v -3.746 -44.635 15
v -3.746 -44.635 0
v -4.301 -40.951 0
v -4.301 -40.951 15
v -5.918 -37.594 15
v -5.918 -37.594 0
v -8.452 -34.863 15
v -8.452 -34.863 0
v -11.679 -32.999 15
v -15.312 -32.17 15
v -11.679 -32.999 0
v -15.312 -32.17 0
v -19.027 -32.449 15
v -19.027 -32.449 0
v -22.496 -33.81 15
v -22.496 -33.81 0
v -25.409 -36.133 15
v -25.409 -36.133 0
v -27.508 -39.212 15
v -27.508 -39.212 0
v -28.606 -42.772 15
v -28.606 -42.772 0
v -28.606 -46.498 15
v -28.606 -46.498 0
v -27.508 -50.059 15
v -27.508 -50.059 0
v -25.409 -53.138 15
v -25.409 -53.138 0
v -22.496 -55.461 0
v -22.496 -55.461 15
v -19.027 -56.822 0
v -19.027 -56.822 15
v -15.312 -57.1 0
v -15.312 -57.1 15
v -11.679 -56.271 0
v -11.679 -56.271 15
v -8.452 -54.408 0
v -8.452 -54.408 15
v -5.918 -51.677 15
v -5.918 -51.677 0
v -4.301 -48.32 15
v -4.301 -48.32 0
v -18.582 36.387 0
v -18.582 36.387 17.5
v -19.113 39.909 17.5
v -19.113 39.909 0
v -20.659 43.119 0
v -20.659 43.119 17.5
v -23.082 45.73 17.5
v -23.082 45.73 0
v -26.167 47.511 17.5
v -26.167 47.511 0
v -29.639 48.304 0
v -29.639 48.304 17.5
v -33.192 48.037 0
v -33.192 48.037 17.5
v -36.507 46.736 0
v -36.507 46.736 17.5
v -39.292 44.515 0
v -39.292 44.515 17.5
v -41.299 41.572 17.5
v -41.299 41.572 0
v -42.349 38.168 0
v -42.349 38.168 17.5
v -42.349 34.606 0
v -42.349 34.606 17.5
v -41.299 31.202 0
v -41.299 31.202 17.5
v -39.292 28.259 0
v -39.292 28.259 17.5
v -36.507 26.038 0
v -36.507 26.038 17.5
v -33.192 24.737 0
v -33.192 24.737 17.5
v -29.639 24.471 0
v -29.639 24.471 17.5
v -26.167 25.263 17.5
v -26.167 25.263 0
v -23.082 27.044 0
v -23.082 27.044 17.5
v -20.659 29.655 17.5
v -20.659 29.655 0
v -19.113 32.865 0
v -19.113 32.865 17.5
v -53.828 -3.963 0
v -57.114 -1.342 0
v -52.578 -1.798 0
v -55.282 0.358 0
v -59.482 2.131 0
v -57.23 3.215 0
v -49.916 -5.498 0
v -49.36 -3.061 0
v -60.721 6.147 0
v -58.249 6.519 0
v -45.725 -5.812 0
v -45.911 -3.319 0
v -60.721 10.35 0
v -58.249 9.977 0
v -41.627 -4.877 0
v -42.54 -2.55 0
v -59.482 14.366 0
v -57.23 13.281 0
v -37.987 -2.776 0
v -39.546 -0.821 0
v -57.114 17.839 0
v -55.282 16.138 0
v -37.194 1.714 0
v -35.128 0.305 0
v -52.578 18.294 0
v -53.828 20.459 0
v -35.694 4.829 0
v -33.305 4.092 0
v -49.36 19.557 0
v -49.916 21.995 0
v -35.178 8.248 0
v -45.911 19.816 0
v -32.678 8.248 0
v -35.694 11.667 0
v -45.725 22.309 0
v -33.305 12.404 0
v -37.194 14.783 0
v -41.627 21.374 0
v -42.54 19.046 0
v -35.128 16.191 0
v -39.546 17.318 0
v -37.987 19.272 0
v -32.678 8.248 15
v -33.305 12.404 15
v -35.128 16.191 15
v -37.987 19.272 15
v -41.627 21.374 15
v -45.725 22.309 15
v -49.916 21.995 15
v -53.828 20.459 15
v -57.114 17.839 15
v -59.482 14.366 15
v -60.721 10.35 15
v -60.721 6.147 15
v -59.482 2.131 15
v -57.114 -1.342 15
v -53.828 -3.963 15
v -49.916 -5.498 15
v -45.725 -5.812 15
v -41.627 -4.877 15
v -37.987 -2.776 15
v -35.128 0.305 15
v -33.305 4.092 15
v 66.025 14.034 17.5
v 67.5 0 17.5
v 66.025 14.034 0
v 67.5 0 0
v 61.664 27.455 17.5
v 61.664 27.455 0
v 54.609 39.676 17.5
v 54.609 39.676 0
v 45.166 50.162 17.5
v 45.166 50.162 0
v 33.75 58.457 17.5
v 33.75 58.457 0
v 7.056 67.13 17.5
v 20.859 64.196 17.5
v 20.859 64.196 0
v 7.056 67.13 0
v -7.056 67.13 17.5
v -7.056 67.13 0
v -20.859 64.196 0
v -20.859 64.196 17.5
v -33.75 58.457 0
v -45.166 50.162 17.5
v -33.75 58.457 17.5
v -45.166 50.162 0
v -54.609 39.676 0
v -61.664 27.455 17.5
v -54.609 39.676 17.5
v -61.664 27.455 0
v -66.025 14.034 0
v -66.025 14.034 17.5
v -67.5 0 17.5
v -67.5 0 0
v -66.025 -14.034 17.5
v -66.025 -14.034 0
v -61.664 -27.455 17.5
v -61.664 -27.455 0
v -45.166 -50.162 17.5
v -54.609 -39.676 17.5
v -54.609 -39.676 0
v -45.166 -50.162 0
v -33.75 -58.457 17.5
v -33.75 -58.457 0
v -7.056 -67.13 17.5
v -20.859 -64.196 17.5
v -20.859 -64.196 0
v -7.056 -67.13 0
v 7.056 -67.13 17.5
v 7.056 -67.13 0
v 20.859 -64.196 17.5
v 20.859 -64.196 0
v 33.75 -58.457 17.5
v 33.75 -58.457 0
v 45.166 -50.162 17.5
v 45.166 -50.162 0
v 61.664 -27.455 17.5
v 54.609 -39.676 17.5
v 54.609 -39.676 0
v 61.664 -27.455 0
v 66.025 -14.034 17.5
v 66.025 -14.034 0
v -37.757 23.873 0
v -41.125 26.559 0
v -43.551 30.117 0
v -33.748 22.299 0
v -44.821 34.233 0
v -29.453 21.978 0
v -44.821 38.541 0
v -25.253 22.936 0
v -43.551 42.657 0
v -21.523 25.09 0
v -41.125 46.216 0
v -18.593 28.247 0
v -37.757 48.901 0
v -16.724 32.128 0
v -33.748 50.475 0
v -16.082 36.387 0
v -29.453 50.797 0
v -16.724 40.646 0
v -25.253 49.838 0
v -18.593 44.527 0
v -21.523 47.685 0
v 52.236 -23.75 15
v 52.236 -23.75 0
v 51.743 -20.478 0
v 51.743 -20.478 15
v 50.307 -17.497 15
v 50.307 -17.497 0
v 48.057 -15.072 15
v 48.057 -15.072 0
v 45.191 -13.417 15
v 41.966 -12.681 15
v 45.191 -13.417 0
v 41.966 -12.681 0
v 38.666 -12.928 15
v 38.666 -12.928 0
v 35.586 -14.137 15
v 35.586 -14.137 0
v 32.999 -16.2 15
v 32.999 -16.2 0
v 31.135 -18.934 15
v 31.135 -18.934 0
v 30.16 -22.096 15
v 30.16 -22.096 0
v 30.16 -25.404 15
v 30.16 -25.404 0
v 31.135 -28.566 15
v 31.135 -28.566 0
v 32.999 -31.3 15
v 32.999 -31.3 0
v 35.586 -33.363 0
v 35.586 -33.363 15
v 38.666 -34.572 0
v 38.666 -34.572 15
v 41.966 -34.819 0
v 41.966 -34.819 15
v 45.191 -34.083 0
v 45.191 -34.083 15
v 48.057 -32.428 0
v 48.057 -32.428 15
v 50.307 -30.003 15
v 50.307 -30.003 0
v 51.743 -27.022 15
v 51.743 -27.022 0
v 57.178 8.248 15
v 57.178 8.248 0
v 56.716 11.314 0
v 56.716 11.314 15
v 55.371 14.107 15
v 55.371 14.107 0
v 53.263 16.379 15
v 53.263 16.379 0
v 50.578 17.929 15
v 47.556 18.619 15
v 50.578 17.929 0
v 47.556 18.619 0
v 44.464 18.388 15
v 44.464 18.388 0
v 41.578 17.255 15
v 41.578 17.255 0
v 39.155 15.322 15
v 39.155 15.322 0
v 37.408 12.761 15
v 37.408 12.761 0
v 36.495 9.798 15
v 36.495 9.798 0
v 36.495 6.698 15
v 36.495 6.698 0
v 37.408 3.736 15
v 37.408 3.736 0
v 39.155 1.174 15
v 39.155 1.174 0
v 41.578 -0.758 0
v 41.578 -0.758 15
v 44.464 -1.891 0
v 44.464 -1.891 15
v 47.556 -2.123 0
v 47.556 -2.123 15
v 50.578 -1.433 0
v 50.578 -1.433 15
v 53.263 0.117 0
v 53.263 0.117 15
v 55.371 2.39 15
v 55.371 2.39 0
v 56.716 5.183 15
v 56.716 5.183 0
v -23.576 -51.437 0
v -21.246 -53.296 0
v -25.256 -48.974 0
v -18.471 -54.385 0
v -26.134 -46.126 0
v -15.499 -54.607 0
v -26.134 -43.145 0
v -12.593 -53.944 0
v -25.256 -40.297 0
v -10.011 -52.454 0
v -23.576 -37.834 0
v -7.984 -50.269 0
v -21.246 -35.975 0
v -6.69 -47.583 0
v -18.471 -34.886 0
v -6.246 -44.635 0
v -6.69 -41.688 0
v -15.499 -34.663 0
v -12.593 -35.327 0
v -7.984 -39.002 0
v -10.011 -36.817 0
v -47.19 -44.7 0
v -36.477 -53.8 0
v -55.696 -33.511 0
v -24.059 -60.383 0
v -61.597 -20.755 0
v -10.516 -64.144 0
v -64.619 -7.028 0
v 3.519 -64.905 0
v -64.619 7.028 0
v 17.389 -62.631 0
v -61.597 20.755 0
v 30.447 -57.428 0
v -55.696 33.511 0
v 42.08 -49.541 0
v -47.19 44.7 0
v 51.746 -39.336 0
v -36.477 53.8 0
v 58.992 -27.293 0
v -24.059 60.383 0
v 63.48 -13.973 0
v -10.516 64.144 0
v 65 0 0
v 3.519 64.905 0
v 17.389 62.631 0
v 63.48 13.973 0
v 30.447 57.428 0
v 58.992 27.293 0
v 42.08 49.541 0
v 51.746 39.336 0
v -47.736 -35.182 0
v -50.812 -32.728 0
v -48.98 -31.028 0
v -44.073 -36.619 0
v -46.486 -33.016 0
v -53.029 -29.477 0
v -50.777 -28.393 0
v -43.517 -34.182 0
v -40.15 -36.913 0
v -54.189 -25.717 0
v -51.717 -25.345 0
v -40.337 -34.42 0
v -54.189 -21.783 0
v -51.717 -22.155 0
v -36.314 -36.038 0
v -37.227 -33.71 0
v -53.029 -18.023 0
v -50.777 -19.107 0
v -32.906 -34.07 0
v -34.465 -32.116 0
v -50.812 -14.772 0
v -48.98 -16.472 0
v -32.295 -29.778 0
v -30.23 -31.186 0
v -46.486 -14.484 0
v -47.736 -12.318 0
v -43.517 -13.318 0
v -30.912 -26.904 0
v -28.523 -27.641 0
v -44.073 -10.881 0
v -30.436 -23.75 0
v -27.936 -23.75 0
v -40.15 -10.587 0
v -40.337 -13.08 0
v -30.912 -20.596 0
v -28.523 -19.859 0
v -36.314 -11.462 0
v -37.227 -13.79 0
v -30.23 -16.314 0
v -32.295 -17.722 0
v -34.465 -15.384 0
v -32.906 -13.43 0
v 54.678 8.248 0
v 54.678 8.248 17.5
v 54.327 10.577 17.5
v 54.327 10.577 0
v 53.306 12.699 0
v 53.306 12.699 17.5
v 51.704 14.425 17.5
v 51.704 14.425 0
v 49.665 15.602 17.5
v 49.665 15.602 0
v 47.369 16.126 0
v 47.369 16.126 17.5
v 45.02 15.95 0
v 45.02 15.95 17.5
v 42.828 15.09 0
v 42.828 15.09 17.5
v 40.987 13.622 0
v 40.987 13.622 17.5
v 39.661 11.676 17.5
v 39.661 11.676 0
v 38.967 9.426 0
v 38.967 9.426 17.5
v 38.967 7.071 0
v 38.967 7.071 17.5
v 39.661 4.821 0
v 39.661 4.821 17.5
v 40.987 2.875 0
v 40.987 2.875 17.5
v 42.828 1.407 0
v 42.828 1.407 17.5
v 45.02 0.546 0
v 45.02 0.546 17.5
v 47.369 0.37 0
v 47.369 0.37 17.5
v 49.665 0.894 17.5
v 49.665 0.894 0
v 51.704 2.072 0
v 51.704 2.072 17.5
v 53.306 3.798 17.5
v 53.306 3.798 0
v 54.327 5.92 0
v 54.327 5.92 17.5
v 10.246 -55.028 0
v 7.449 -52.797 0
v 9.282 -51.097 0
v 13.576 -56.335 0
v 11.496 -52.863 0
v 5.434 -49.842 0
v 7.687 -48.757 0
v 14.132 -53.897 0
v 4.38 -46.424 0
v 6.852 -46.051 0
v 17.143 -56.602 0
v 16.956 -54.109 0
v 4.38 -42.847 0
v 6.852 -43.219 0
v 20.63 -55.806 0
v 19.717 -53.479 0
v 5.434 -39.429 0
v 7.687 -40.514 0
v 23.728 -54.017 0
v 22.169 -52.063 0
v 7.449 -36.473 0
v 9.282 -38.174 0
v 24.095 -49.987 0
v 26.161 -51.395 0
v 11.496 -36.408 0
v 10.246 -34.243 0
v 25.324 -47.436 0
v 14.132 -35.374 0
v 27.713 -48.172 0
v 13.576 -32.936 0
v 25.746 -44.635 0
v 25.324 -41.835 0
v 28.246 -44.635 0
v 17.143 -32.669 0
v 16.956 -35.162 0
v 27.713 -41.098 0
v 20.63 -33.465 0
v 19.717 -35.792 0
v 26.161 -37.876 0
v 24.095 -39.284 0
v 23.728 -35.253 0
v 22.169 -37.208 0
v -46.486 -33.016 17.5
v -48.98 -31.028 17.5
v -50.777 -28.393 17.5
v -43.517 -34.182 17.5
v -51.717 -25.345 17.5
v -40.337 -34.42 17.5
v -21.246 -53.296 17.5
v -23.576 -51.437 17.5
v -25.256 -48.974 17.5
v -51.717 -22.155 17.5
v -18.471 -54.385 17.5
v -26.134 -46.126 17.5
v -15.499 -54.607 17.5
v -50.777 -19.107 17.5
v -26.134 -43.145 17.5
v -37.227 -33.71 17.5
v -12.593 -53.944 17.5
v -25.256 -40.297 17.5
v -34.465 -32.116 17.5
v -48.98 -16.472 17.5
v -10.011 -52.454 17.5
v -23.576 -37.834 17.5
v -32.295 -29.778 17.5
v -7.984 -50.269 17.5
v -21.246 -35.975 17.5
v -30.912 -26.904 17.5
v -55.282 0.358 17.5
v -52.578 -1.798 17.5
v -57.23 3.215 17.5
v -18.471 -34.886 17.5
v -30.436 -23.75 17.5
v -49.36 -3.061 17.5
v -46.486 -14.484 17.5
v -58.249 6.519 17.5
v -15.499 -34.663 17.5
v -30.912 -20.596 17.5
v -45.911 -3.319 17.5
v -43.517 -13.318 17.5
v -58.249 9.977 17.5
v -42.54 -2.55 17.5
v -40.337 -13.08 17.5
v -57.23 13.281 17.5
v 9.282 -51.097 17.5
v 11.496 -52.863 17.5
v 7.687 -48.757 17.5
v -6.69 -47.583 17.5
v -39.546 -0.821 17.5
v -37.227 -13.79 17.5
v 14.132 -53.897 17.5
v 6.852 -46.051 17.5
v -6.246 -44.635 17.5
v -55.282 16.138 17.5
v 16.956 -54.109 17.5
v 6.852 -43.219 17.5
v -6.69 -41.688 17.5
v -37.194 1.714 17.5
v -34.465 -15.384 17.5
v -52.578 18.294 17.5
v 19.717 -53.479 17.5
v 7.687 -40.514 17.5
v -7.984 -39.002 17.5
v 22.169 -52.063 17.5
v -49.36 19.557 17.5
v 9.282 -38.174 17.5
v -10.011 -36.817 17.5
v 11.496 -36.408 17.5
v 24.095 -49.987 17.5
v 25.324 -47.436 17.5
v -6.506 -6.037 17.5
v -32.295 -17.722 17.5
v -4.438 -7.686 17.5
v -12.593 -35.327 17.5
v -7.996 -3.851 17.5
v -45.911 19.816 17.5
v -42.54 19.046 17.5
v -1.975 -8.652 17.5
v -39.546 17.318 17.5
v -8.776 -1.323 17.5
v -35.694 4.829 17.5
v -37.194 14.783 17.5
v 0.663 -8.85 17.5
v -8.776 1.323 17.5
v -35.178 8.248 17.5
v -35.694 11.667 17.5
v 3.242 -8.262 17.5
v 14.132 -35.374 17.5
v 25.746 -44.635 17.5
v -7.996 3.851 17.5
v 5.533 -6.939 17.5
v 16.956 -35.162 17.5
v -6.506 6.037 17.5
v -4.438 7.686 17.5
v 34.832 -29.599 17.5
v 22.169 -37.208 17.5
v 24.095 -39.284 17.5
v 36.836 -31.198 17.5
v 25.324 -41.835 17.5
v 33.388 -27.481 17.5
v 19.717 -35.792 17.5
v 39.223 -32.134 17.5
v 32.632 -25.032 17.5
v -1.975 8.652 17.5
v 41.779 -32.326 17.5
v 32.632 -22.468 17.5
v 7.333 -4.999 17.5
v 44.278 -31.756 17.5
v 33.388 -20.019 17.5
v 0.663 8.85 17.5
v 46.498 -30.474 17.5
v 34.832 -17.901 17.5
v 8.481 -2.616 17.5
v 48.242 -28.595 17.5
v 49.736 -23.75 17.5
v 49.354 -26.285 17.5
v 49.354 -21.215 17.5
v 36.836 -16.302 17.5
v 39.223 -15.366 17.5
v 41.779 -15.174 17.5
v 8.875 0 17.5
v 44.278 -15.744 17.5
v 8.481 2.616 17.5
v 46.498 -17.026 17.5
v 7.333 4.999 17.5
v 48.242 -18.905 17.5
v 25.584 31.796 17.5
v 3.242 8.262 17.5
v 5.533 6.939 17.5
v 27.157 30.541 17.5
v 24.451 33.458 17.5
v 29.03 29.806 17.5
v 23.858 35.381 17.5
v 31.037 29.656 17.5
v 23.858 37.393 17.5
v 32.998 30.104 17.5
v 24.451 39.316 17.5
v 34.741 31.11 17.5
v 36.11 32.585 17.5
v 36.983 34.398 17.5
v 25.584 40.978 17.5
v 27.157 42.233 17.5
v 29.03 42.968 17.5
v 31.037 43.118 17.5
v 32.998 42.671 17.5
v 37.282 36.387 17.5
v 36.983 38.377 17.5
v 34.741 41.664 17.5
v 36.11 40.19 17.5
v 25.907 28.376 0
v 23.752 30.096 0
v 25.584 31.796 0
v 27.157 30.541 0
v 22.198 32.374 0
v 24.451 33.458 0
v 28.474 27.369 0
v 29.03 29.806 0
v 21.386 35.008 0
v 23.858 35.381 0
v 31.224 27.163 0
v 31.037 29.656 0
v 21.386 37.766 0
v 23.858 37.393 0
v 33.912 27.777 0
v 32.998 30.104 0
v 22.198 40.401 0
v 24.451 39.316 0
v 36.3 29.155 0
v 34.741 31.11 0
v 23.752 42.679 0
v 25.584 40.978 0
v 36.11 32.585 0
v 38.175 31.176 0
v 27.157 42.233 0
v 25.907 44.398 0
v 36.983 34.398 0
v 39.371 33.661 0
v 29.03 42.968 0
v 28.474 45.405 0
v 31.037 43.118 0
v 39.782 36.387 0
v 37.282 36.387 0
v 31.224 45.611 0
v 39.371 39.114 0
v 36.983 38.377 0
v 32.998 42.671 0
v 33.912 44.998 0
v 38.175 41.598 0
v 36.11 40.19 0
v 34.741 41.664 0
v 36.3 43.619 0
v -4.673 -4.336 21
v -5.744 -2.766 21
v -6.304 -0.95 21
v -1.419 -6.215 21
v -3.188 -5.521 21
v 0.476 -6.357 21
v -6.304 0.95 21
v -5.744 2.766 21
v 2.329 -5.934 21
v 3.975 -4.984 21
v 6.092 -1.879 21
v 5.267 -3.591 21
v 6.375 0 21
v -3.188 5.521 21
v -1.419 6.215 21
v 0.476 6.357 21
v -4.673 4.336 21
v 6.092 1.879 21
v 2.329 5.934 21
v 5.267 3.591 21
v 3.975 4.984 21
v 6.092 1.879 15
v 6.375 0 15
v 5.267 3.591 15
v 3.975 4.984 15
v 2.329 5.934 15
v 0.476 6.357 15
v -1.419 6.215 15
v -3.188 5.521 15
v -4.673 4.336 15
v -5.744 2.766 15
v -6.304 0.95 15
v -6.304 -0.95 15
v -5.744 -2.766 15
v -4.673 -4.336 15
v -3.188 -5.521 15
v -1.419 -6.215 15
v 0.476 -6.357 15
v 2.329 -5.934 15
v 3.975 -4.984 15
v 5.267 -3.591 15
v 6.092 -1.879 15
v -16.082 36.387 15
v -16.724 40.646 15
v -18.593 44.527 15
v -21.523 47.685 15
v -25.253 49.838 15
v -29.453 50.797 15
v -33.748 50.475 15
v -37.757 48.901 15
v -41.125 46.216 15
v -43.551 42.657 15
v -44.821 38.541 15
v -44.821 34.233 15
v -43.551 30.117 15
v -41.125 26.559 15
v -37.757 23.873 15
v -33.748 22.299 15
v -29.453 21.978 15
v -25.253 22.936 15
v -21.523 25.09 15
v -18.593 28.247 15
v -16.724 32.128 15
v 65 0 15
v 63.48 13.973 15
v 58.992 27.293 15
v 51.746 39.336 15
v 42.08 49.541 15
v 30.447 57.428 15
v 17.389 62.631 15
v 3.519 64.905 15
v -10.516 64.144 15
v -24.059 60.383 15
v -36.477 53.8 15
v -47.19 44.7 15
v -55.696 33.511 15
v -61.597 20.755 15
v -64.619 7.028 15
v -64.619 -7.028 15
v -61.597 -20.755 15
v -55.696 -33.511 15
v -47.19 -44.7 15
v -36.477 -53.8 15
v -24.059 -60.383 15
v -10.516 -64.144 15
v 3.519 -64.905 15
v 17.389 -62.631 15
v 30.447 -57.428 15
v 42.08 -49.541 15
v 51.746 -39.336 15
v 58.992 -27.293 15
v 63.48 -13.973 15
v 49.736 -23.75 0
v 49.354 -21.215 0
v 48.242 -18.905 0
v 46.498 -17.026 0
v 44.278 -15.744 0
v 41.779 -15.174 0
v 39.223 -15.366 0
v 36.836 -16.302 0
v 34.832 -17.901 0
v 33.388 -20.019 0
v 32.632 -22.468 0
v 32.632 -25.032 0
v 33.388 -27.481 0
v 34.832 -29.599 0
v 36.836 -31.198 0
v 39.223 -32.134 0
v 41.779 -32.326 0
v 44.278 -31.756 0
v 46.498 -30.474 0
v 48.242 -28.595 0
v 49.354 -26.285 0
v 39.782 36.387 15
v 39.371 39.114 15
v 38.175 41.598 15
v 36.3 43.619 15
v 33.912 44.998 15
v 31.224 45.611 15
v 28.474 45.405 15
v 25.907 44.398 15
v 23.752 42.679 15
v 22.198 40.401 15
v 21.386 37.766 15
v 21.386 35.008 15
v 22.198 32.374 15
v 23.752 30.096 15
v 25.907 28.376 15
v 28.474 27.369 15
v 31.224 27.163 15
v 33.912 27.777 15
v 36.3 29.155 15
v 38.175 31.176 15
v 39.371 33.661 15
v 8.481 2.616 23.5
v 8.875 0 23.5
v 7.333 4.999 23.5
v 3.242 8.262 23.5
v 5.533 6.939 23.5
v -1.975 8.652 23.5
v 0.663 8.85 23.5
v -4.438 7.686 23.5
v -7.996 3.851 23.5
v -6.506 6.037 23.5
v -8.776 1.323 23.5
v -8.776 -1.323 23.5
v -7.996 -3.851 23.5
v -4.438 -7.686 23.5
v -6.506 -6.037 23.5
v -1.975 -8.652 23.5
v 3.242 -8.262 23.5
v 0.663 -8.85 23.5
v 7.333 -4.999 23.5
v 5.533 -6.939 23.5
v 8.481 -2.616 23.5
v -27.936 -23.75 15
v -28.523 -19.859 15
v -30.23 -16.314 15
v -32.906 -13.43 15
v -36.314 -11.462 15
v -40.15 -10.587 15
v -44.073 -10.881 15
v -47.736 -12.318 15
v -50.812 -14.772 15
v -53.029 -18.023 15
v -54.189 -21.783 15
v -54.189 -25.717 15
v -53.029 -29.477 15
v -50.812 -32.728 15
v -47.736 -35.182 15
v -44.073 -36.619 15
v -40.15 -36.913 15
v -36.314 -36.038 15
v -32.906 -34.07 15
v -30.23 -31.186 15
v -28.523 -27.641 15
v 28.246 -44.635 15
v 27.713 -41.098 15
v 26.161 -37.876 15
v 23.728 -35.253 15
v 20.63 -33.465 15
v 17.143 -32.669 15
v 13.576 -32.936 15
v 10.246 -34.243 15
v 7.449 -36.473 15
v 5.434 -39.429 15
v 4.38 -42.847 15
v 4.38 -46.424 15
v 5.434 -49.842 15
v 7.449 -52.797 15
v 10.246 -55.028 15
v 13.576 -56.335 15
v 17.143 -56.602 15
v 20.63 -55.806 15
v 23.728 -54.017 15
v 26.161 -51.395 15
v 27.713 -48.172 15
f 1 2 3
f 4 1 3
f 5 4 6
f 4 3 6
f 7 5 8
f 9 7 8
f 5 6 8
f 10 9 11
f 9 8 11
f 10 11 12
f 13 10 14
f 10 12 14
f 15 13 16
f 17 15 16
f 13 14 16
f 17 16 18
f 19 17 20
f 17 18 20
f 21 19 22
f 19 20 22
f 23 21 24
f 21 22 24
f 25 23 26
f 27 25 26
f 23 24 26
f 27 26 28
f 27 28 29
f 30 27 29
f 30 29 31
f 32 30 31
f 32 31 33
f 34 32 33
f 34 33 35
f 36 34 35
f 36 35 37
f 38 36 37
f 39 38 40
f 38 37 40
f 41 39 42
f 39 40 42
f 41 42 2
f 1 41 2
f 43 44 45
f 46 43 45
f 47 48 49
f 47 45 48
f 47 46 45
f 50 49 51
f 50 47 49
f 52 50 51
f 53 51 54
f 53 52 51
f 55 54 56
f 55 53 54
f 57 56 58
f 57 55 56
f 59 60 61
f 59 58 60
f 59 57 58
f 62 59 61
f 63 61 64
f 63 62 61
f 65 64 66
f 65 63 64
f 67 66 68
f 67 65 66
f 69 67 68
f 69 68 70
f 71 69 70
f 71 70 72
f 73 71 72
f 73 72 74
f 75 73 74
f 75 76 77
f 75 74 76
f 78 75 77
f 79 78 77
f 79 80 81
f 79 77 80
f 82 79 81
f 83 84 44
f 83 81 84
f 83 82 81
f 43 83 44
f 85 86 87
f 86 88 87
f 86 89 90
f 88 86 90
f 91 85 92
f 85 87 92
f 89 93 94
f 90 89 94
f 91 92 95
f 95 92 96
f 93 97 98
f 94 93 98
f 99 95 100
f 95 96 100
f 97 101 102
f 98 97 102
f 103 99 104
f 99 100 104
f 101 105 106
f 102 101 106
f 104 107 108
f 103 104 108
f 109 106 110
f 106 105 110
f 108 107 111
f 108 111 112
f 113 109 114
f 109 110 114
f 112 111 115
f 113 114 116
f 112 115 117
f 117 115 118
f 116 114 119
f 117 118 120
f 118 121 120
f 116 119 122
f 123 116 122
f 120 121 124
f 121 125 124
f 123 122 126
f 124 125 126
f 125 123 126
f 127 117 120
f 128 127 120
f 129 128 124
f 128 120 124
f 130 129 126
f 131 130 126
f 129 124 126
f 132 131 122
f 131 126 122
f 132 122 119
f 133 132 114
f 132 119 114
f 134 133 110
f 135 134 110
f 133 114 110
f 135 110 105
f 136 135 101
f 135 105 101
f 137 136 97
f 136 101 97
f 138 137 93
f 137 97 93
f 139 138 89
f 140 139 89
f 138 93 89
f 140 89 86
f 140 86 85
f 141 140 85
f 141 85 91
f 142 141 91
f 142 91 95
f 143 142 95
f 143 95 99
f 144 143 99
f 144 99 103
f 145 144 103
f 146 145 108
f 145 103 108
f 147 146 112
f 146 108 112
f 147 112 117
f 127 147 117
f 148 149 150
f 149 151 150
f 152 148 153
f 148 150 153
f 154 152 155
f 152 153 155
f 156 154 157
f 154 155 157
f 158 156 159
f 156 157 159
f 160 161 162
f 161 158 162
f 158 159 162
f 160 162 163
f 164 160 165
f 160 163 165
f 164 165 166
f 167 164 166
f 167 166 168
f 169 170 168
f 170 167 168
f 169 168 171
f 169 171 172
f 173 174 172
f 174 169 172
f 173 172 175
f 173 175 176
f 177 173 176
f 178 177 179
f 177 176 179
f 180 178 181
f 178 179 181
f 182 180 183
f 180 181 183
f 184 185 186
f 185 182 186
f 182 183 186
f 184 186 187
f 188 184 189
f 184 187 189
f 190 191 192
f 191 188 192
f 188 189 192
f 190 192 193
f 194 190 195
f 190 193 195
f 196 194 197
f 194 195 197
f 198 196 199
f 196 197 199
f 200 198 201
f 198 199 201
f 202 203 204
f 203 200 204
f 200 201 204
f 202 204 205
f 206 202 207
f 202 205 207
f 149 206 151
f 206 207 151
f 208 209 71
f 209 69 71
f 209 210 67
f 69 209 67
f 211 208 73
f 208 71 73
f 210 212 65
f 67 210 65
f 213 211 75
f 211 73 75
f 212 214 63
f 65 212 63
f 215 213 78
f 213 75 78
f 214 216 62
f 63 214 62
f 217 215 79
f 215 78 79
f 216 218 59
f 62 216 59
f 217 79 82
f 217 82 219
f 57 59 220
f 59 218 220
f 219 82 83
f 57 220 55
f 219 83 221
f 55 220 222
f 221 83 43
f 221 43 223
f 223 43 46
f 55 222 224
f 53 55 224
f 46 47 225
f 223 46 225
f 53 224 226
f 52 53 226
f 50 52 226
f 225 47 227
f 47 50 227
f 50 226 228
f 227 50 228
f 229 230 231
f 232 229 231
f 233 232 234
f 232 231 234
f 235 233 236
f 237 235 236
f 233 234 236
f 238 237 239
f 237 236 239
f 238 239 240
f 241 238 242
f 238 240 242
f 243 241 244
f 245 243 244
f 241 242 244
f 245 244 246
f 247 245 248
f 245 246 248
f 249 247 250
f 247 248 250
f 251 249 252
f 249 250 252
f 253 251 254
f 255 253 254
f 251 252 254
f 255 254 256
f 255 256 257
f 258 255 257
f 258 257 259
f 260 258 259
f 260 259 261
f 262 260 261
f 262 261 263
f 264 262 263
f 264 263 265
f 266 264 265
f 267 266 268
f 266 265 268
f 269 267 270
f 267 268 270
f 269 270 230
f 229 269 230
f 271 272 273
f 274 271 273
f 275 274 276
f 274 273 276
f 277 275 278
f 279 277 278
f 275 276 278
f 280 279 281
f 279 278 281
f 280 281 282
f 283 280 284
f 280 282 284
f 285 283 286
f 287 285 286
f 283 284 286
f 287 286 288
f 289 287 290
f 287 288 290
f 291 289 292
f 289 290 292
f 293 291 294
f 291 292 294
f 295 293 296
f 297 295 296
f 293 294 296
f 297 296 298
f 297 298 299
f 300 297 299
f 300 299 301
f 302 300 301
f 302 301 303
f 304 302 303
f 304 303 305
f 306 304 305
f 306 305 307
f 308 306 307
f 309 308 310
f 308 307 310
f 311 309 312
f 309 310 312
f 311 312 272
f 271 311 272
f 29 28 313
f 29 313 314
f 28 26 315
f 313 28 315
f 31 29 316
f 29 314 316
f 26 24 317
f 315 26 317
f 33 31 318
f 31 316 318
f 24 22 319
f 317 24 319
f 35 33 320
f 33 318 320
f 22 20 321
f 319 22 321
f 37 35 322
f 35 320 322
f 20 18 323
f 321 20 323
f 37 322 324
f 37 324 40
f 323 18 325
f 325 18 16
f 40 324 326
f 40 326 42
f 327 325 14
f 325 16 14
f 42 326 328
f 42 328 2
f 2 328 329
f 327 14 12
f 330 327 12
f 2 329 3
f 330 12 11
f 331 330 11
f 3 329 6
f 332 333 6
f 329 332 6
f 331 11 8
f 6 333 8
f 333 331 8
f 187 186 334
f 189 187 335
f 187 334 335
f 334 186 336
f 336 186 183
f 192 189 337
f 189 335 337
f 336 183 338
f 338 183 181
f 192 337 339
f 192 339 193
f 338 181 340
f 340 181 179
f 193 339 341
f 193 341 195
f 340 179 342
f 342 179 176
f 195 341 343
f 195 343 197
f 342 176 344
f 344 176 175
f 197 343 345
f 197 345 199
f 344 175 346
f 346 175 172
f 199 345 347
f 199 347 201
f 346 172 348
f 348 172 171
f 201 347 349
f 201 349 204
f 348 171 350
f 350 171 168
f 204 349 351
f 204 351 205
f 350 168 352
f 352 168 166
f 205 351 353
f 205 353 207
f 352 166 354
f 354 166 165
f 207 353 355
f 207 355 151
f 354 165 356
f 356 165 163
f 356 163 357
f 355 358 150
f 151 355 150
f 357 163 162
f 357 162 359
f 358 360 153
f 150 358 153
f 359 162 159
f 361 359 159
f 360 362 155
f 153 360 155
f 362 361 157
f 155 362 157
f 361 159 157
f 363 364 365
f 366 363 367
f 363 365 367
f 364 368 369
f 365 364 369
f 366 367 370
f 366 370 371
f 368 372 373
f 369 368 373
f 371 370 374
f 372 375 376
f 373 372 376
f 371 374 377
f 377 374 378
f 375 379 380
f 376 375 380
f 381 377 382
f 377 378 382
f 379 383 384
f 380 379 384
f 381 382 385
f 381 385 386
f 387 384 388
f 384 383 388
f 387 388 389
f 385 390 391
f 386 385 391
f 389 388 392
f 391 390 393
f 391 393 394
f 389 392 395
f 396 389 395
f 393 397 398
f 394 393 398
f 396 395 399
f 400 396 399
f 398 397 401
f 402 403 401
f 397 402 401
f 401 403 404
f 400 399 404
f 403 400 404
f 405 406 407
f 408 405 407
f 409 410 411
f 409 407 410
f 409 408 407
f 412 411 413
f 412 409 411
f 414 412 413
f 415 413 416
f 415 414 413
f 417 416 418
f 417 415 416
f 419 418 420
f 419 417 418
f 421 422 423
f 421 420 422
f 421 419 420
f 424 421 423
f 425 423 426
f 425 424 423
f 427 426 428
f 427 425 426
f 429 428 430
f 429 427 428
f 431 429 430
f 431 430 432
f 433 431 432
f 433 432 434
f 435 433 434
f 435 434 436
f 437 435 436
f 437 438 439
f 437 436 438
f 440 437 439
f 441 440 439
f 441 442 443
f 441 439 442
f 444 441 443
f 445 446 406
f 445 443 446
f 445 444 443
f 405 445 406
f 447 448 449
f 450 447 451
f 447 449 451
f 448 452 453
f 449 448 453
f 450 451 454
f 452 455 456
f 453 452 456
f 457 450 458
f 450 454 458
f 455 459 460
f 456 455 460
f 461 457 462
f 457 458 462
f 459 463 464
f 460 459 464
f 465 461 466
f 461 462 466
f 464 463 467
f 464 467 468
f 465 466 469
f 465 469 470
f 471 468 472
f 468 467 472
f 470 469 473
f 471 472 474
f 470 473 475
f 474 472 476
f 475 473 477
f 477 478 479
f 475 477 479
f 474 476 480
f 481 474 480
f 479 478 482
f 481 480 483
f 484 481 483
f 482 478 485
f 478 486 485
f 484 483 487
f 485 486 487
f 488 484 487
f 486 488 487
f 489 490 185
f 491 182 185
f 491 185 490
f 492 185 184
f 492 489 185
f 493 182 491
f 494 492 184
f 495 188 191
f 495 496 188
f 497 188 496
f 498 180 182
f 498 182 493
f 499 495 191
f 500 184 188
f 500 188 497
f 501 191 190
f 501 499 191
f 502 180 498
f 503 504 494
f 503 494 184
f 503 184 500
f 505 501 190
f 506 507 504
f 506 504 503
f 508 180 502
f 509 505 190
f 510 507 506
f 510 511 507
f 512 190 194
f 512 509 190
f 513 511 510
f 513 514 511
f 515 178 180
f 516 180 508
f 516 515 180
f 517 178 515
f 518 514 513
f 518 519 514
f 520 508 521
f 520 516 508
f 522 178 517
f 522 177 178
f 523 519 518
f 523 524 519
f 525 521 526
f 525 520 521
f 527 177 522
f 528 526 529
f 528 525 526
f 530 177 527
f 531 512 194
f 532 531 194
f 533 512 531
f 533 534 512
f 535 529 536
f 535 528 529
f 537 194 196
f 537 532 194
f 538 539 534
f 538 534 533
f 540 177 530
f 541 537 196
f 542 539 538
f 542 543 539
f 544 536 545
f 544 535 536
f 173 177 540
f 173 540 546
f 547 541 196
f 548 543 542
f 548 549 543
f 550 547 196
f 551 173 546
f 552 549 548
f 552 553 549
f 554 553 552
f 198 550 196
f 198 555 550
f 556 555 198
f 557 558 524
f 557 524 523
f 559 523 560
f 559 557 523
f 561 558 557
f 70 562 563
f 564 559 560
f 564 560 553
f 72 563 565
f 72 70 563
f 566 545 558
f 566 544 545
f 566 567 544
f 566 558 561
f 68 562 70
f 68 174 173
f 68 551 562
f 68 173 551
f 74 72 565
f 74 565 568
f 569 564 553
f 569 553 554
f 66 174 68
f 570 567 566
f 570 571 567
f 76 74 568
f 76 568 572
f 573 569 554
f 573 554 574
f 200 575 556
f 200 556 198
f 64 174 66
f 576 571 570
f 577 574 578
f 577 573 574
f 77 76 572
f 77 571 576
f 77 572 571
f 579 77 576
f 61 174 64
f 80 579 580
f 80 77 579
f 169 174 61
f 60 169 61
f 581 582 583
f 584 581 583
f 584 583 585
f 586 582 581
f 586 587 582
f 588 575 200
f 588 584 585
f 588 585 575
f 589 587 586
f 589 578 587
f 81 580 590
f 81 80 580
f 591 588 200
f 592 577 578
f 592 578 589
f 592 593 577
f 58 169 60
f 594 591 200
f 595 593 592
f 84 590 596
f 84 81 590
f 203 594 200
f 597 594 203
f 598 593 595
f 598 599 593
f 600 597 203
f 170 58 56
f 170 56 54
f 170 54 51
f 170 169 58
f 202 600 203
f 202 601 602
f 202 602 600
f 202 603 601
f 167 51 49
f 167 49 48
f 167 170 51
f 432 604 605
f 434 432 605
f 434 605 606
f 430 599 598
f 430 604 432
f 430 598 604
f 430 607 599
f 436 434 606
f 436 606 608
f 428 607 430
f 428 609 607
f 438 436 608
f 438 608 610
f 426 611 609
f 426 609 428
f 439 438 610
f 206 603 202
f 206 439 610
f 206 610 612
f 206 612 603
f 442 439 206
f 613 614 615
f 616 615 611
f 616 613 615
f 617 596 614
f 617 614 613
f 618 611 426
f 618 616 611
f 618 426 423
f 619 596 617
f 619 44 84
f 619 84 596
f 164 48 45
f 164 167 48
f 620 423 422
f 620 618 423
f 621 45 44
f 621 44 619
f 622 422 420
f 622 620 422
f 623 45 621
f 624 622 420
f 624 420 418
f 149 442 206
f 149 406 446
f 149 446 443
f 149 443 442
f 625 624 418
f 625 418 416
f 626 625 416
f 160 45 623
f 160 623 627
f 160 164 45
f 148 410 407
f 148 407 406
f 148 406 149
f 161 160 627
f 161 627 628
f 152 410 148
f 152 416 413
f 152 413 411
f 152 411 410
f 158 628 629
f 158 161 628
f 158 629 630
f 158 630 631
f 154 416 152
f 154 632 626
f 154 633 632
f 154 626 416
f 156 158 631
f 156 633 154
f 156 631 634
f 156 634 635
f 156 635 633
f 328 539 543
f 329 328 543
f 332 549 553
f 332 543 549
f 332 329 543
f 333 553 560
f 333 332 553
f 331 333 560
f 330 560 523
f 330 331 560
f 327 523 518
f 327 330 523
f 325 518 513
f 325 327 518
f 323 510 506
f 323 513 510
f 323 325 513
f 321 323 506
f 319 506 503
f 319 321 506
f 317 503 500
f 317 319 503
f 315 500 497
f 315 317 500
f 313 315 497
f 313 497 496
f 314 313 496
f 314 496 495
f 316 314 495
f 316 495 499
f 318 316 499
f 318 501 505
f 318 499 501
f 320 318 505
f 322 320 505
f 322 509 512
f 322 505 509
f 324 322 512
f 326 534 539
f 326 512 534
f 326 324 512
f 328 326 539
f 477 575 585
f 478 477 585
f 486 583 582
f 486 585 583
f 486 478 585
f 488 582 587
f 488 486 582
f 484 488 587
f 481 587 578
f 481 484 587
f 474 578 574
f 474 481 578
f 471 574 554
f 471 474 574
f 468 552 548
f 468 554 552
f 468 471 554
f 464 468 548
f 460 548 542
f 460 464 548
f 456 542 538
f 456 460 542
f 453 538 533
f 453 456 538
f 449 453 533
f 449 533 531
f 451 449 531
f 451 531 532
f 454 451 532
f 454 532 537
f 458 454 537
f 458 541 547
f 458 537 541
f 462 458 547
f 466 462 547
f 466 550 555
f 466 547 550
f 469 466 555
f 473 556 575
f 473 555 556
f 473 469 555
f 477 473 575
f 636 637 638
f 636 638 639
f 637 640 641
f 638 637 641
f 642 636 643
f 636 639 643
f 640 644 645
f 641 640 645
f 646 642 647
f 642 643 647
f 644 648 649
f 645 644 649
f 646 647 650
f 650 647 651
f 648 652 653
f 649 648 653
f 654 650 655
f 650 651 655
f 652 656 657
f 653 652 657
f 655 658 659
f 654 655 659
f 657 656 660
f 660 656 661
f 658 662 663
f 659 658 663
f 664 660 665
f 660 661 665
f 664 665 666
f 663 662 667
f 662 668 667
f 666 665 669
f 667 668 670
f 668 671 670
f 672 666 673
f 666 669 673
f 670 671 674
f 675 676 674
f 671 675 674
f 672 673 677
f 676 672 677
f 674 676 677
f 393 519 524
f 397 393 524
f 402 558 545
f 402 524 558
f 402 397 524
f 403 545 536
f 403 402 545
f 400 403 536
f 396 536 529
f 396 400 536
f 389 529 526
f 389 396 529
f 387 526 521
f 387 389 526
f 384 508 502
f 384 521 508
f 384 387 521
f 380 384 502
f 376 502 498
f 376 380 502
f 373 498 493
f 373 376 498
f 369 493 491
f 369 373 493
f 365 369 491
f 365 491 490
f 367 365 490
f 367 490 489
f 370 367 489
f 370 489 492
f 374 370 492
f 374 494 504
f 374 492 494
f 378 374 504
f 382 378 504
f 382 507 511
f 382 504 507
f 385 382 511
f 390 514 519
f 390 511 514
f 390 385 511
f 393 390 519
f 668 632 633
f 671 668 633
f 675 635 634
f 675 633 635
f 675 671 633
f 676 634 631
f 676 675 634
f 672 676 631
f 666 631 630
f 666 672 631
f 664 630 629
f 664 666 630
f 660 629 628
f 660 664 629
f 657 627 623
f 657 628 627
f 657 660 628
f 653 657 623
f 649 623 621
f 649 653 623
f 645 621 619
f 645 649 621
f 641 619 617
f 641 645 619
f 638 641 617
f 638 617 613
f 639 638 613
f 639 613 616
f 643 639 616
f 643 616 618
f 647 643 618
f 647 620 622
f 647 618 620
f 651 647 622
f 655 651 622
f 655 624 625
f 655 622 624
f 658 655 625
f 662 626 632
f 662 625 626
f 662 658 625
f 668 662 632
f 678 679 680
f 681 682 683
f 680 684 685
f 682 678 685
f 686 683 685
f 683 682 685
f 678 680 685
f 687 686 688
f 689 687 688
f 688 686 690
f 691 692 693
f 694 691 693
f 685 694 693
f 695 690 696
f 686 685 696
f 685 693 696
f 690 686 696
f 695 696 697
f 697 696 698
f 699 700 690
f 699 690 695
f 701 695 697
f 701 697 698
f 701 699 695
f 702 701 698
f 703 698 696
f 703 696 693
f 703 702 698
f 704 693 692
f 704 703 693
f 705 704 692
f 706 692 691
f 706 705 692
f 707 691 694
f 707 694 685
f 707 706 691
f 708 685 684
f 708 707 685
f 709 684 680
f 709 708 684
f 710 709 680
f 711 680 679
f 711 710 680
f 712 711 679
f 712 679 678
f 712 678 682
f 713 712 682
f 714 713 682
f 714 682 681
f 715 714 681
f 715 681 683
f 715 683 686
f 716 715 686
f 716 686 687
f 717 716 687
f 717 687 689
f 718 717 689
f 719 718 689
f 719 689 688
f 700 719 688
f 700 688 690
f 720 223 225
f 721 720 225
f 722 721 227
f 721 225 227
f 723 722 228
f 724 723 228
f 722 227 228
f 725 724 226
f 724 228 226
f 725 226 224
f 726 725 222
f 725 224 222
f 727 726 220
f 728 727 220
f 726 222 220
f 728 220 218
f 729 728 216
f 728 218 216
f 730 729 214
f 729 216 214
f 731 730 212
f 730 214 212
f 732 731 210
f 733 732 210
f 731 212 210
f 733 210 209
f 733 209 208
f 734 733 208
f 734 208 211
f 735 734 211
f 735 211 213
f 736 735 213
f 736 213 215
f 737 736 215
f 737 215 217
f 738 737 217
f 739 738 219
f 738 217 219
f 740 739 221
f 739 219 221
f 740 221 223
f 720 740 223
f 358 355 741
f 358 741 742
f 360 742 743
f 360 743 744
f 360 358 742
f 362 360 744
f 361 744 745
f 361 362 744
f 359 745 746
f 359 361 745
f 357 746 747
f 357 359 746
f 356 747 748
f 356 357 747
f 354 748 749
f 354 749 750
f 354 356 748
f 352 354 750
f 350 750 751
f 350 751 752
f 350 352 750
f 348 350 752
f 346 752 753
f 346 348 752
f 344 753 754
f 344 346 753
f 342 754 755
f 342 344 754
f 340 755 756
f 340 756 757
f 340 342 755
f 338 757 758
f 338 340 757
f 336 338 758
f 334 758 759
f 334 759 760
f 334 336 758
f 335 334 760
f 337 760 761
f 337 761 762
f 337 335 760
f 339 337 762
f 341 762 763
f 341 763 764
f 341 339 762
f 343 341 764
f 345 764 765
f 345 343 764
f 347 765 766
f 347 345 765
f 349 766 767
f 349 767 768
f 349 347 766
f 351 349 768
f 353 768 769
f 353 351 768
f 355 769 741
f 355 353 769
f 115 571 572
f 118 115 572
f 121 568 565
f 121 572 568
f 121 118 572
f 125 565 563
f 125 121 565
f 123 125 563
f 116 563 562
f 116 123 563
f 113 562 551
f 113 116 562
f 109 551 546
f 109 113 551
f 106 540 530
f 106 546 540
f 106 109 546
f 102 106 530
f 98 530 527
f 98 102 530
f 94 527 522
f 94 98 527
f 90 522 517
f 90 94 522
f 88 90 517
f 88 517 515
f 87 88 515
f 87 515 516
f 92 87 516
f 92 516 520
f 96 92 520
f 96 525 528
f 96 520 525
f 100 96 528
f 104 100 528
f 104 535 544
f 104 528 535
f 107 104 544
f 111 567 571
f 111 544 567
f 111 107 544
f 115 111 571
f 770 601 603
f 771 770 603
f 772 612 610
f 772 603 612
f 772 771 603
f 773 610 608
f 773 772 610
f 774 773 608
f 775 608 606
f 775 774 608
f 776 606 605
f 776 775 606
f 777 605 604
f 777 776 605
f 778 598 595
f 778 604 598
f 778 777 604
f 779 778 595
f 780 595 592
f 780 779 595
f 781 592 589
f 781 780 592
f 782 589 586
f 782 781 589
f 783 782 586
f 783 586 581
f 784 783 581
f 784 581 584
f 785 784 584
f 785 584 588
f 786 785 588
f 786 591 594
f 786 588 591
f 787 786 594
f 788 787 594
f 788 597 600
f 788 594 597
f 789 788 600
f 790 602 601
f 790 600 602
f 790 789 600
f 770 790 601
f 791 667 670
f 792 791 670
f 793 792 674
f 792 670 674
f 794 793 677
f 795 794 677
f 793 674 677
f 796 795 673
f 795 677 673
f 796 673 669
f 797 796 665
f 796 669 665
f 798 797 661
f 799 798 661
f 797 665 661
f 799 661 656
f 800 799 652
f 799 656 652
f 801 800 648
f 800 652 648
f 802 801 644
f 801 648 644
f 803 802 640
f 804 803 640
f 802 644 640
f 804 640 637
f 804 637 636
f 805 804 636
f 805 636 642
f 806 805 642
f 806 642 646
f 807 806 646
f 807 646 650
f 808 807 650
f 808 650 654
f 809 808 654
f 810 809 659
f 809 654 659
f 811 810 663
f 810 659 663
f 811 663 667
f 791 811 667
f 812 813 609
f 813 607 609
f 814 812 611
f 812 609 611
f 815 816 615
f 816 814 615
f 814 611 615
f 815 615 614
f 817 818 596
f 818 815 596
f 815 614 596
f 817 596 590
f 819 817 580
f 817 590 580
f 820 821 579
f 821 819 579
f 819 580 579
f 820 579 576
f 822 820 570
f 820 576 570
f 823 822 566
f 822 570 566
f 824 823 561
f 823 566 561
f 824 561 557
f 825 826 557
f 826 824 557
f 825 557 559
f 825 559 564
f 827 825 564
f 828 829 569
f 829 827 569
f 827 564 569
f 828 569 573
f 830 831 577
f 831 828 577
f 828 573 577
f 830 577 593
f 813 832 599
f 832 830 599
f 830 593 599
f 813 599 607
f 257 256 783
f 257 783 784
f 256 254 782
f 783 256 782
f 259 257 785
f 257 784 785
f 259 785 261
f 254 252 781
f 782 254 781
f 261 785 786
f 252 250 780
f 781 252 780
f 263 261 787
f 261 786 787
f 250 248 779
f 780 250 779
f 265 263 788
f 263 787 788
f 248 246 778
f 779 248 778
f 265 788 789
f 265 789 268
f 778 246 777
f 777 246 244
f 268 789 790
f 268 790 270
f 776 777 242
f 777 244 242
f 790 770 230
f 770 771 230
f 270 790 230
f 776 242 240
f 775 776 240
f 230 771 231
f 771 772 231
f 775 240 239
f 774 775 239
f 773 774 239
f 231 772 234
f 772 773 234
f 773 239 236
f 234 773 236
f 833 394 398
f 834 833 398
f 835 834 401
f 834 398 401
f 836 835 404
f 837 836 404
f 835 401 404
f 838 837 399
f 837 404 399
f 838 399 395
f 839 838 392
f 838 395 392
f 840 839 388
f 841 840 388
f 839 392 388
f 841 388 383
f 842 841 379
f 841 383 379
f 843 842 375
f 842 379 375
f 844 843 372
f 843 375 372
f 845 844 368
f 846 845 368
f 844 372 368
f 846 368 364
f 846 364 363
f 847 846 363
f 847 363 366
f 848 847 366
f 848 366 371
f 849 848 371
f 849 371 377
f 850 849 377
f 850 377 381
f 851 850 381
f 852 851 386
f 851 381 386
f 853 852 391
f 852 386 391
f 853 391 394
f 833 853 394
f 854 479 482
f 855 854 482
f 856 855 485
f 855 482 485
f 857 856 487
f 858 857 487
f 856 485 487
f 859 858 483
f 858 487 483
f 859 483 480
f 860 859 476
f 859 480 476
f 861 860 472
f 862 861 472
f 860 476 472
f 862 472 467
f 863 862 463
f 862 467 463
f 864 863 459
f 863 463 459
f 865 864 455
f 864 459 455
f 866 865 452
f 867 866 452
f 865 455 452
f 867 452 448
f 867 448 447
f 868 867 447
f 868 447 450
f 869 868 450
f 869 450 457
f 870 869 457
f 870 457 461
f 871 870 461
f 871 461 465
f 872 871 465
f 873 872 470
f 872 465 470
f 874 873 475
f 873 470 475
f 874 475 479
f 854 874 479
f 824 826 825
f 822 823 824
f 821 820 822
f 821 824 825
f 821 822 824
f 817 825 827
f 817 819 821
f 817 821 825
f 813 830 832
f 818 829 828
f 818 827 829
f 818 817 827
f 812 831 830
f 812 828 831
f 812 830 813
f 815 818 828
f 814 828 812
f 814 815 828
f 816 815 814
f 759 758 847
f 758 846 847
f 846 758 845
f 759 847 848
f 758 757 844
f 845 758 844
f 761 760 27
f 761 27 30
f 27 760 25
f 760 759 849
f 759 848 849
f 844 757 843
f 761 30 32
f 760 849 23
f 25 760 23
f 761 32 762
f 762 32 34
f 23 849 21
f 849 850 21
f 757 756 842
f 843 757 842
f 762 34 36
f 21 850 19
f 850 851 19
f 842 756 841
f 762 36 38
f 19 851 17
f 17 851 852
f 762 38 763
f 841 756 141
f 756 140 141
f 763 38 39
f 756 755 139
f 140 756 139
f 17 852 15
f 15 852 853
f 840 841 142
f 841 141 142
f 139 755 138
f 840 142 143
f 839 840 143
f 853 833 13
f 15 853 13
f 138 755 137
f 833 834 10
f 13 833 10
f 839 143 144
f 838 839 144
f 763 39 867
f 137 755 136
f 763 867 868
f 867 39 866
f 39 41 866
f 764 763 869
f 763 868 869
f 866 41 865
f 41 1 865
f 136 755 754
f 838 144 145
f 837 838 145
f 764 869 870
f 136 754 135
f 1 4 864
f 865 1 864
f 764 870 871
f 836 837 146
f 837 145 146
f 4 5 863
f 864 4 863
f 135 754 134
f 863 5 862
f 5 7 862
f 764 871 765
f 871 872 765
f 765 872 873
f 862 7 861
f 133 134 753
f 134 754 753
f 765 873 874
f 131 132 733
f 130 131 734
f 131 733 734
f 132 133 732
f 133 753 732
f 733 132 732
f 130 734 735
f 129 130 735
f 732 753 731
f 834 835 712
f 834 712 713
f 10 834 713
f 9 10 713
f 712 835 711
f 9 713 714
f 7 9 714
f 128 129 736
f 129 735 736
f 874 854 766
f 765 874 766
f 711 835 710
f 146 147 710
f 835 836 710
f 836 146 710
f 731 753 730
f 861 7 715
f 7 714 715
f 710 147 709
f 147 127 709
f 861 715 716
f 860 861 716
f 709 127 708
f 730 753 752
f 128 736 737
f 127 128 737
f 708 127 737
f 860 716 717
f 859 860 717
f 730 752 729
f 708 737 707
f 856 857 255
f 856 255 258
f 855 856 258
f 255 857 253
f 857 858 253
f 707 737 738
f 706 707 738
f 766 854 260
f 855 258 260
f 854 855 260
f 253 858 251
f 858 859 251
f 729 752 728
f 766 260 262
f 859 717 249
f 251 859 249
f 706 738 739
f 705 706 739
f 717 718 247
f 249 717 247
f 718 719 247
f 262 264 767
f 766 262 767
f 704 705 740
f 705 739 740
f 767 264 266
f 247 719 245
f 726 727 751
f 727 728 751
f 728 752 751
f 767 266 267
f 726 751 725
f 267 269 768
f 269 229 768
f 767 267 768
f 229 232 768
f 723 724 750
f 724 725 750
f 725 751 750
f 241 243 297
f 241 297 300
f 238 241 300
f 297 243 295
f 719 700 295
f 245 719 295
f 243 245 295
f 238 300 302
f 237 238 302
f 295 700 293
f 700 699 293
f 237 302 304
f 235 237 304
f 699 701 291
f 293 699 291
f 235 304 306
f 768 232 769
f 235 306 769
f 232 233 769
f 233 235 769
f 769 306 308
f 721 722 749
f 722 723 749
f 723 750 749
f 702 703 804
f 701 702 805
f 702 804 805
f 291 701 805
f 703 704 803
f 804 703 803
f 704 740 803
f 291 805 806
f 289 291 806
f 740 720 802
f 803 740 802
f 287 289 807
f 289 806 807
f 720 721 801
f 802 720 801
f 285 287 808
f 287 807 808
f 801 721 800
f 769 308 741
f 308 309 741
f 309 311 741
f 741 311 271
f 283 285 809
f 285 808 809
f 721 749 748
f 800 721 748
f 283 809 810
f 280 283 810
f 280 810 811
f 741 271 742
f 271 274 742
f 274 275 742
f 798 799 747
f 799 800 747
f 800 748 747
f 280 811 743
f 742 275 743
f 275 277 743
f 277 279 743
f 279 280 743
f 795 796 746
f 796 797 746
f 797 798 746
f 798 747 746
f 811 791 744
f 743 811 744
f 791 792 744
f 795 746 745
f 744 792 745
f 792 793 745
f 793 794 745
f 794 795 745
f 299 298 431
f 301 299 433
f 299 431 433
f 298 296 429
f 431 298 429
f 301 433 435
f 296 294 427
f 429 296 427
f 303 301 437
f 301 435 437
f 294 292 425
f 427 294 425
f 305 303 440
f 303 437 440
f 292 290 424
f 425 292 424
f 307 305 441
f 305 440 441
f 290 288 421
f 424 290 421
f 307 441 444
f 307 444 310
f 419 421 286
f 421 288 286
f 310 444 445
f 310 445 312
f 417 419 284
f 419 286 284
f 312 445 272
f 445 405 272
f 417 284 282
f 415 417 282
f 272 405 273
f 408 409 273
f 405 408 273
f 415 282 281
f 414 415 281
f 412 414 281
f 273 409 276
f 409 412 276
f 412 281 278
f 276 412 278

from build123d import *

# Parameters (mm, degrees)
F0_R     = 6.375
F1_DEPTH = 21
F0_R_2   = 65
F0_R_3   = 12.5
F0_R_4   = 13.2
F0_R_5   = 12
F0_R_6   = 11.1
F0_R_7   = 14.1
F0_R_8   = 14.45
F0_R_9   = 10.4
F0_R_10  = 9.25
F2_DEPTH = 15
F3_T     = 2.5


with BuildPart() as f1:
    # F0 (on Top) → F1 (new body)
    with BuildSketch(Plane.XY):
        Circle(F0_R)
    extrude(amount=F1_DEPTH)

    # F0 (on Top) → F2 (join)
    with BuildSketch(Plane.XY):
        Circle(F0_R_2)
        with Locations((-16.245956808, -44.6353994873)):
            Circle(F0_R_3, mode=Mode.SUBTRACT)
        with Locations((-41.1362066798, -23.75)):
            Circle(F0_R_4, mode=Mode.SUBTRACT)
        with Locations((16.245956808, -44.6353994873)):
            Circle(F0_R_5, mode=Mode.SUBTRACT)
        with Locations((41.1362066798, -23.75)):
            Circle(F0_R_6, mode=Mode.SUBTRACT)
        with Locations((-46.7783682681, 8.2482884392)):
            Circle(F0_R_7, mode=Mode.SUBTRACT)
        with Locations((-30.5324114601, 36.3871110482)):
            Circle(F0_R_8, mode=Mode.SUBTRACT)
        Circle(F0_R, mode=Mode.SUBTRACT)
        with Locations((46.7783682681, 8.2482884392)):
            Circle(F0_R_9, mode=Mode.SUBTRACT)
        with Locations((30.5324114601, 36.3871110482)):
            Circle(F0_R_10, mode=Mode.SUBTRACT)
    extrude(amount=F2_DEPTH)

    # F3
    f3_openings = [f1.faces().sort_by_distance(p)[0] for p in [
        (3.404358, 2.387056, 0),
    ]]
    offset(amount=F3_T, openings=f3_openings, kind=Kind.INTERSECTION)


solid = f1.part
